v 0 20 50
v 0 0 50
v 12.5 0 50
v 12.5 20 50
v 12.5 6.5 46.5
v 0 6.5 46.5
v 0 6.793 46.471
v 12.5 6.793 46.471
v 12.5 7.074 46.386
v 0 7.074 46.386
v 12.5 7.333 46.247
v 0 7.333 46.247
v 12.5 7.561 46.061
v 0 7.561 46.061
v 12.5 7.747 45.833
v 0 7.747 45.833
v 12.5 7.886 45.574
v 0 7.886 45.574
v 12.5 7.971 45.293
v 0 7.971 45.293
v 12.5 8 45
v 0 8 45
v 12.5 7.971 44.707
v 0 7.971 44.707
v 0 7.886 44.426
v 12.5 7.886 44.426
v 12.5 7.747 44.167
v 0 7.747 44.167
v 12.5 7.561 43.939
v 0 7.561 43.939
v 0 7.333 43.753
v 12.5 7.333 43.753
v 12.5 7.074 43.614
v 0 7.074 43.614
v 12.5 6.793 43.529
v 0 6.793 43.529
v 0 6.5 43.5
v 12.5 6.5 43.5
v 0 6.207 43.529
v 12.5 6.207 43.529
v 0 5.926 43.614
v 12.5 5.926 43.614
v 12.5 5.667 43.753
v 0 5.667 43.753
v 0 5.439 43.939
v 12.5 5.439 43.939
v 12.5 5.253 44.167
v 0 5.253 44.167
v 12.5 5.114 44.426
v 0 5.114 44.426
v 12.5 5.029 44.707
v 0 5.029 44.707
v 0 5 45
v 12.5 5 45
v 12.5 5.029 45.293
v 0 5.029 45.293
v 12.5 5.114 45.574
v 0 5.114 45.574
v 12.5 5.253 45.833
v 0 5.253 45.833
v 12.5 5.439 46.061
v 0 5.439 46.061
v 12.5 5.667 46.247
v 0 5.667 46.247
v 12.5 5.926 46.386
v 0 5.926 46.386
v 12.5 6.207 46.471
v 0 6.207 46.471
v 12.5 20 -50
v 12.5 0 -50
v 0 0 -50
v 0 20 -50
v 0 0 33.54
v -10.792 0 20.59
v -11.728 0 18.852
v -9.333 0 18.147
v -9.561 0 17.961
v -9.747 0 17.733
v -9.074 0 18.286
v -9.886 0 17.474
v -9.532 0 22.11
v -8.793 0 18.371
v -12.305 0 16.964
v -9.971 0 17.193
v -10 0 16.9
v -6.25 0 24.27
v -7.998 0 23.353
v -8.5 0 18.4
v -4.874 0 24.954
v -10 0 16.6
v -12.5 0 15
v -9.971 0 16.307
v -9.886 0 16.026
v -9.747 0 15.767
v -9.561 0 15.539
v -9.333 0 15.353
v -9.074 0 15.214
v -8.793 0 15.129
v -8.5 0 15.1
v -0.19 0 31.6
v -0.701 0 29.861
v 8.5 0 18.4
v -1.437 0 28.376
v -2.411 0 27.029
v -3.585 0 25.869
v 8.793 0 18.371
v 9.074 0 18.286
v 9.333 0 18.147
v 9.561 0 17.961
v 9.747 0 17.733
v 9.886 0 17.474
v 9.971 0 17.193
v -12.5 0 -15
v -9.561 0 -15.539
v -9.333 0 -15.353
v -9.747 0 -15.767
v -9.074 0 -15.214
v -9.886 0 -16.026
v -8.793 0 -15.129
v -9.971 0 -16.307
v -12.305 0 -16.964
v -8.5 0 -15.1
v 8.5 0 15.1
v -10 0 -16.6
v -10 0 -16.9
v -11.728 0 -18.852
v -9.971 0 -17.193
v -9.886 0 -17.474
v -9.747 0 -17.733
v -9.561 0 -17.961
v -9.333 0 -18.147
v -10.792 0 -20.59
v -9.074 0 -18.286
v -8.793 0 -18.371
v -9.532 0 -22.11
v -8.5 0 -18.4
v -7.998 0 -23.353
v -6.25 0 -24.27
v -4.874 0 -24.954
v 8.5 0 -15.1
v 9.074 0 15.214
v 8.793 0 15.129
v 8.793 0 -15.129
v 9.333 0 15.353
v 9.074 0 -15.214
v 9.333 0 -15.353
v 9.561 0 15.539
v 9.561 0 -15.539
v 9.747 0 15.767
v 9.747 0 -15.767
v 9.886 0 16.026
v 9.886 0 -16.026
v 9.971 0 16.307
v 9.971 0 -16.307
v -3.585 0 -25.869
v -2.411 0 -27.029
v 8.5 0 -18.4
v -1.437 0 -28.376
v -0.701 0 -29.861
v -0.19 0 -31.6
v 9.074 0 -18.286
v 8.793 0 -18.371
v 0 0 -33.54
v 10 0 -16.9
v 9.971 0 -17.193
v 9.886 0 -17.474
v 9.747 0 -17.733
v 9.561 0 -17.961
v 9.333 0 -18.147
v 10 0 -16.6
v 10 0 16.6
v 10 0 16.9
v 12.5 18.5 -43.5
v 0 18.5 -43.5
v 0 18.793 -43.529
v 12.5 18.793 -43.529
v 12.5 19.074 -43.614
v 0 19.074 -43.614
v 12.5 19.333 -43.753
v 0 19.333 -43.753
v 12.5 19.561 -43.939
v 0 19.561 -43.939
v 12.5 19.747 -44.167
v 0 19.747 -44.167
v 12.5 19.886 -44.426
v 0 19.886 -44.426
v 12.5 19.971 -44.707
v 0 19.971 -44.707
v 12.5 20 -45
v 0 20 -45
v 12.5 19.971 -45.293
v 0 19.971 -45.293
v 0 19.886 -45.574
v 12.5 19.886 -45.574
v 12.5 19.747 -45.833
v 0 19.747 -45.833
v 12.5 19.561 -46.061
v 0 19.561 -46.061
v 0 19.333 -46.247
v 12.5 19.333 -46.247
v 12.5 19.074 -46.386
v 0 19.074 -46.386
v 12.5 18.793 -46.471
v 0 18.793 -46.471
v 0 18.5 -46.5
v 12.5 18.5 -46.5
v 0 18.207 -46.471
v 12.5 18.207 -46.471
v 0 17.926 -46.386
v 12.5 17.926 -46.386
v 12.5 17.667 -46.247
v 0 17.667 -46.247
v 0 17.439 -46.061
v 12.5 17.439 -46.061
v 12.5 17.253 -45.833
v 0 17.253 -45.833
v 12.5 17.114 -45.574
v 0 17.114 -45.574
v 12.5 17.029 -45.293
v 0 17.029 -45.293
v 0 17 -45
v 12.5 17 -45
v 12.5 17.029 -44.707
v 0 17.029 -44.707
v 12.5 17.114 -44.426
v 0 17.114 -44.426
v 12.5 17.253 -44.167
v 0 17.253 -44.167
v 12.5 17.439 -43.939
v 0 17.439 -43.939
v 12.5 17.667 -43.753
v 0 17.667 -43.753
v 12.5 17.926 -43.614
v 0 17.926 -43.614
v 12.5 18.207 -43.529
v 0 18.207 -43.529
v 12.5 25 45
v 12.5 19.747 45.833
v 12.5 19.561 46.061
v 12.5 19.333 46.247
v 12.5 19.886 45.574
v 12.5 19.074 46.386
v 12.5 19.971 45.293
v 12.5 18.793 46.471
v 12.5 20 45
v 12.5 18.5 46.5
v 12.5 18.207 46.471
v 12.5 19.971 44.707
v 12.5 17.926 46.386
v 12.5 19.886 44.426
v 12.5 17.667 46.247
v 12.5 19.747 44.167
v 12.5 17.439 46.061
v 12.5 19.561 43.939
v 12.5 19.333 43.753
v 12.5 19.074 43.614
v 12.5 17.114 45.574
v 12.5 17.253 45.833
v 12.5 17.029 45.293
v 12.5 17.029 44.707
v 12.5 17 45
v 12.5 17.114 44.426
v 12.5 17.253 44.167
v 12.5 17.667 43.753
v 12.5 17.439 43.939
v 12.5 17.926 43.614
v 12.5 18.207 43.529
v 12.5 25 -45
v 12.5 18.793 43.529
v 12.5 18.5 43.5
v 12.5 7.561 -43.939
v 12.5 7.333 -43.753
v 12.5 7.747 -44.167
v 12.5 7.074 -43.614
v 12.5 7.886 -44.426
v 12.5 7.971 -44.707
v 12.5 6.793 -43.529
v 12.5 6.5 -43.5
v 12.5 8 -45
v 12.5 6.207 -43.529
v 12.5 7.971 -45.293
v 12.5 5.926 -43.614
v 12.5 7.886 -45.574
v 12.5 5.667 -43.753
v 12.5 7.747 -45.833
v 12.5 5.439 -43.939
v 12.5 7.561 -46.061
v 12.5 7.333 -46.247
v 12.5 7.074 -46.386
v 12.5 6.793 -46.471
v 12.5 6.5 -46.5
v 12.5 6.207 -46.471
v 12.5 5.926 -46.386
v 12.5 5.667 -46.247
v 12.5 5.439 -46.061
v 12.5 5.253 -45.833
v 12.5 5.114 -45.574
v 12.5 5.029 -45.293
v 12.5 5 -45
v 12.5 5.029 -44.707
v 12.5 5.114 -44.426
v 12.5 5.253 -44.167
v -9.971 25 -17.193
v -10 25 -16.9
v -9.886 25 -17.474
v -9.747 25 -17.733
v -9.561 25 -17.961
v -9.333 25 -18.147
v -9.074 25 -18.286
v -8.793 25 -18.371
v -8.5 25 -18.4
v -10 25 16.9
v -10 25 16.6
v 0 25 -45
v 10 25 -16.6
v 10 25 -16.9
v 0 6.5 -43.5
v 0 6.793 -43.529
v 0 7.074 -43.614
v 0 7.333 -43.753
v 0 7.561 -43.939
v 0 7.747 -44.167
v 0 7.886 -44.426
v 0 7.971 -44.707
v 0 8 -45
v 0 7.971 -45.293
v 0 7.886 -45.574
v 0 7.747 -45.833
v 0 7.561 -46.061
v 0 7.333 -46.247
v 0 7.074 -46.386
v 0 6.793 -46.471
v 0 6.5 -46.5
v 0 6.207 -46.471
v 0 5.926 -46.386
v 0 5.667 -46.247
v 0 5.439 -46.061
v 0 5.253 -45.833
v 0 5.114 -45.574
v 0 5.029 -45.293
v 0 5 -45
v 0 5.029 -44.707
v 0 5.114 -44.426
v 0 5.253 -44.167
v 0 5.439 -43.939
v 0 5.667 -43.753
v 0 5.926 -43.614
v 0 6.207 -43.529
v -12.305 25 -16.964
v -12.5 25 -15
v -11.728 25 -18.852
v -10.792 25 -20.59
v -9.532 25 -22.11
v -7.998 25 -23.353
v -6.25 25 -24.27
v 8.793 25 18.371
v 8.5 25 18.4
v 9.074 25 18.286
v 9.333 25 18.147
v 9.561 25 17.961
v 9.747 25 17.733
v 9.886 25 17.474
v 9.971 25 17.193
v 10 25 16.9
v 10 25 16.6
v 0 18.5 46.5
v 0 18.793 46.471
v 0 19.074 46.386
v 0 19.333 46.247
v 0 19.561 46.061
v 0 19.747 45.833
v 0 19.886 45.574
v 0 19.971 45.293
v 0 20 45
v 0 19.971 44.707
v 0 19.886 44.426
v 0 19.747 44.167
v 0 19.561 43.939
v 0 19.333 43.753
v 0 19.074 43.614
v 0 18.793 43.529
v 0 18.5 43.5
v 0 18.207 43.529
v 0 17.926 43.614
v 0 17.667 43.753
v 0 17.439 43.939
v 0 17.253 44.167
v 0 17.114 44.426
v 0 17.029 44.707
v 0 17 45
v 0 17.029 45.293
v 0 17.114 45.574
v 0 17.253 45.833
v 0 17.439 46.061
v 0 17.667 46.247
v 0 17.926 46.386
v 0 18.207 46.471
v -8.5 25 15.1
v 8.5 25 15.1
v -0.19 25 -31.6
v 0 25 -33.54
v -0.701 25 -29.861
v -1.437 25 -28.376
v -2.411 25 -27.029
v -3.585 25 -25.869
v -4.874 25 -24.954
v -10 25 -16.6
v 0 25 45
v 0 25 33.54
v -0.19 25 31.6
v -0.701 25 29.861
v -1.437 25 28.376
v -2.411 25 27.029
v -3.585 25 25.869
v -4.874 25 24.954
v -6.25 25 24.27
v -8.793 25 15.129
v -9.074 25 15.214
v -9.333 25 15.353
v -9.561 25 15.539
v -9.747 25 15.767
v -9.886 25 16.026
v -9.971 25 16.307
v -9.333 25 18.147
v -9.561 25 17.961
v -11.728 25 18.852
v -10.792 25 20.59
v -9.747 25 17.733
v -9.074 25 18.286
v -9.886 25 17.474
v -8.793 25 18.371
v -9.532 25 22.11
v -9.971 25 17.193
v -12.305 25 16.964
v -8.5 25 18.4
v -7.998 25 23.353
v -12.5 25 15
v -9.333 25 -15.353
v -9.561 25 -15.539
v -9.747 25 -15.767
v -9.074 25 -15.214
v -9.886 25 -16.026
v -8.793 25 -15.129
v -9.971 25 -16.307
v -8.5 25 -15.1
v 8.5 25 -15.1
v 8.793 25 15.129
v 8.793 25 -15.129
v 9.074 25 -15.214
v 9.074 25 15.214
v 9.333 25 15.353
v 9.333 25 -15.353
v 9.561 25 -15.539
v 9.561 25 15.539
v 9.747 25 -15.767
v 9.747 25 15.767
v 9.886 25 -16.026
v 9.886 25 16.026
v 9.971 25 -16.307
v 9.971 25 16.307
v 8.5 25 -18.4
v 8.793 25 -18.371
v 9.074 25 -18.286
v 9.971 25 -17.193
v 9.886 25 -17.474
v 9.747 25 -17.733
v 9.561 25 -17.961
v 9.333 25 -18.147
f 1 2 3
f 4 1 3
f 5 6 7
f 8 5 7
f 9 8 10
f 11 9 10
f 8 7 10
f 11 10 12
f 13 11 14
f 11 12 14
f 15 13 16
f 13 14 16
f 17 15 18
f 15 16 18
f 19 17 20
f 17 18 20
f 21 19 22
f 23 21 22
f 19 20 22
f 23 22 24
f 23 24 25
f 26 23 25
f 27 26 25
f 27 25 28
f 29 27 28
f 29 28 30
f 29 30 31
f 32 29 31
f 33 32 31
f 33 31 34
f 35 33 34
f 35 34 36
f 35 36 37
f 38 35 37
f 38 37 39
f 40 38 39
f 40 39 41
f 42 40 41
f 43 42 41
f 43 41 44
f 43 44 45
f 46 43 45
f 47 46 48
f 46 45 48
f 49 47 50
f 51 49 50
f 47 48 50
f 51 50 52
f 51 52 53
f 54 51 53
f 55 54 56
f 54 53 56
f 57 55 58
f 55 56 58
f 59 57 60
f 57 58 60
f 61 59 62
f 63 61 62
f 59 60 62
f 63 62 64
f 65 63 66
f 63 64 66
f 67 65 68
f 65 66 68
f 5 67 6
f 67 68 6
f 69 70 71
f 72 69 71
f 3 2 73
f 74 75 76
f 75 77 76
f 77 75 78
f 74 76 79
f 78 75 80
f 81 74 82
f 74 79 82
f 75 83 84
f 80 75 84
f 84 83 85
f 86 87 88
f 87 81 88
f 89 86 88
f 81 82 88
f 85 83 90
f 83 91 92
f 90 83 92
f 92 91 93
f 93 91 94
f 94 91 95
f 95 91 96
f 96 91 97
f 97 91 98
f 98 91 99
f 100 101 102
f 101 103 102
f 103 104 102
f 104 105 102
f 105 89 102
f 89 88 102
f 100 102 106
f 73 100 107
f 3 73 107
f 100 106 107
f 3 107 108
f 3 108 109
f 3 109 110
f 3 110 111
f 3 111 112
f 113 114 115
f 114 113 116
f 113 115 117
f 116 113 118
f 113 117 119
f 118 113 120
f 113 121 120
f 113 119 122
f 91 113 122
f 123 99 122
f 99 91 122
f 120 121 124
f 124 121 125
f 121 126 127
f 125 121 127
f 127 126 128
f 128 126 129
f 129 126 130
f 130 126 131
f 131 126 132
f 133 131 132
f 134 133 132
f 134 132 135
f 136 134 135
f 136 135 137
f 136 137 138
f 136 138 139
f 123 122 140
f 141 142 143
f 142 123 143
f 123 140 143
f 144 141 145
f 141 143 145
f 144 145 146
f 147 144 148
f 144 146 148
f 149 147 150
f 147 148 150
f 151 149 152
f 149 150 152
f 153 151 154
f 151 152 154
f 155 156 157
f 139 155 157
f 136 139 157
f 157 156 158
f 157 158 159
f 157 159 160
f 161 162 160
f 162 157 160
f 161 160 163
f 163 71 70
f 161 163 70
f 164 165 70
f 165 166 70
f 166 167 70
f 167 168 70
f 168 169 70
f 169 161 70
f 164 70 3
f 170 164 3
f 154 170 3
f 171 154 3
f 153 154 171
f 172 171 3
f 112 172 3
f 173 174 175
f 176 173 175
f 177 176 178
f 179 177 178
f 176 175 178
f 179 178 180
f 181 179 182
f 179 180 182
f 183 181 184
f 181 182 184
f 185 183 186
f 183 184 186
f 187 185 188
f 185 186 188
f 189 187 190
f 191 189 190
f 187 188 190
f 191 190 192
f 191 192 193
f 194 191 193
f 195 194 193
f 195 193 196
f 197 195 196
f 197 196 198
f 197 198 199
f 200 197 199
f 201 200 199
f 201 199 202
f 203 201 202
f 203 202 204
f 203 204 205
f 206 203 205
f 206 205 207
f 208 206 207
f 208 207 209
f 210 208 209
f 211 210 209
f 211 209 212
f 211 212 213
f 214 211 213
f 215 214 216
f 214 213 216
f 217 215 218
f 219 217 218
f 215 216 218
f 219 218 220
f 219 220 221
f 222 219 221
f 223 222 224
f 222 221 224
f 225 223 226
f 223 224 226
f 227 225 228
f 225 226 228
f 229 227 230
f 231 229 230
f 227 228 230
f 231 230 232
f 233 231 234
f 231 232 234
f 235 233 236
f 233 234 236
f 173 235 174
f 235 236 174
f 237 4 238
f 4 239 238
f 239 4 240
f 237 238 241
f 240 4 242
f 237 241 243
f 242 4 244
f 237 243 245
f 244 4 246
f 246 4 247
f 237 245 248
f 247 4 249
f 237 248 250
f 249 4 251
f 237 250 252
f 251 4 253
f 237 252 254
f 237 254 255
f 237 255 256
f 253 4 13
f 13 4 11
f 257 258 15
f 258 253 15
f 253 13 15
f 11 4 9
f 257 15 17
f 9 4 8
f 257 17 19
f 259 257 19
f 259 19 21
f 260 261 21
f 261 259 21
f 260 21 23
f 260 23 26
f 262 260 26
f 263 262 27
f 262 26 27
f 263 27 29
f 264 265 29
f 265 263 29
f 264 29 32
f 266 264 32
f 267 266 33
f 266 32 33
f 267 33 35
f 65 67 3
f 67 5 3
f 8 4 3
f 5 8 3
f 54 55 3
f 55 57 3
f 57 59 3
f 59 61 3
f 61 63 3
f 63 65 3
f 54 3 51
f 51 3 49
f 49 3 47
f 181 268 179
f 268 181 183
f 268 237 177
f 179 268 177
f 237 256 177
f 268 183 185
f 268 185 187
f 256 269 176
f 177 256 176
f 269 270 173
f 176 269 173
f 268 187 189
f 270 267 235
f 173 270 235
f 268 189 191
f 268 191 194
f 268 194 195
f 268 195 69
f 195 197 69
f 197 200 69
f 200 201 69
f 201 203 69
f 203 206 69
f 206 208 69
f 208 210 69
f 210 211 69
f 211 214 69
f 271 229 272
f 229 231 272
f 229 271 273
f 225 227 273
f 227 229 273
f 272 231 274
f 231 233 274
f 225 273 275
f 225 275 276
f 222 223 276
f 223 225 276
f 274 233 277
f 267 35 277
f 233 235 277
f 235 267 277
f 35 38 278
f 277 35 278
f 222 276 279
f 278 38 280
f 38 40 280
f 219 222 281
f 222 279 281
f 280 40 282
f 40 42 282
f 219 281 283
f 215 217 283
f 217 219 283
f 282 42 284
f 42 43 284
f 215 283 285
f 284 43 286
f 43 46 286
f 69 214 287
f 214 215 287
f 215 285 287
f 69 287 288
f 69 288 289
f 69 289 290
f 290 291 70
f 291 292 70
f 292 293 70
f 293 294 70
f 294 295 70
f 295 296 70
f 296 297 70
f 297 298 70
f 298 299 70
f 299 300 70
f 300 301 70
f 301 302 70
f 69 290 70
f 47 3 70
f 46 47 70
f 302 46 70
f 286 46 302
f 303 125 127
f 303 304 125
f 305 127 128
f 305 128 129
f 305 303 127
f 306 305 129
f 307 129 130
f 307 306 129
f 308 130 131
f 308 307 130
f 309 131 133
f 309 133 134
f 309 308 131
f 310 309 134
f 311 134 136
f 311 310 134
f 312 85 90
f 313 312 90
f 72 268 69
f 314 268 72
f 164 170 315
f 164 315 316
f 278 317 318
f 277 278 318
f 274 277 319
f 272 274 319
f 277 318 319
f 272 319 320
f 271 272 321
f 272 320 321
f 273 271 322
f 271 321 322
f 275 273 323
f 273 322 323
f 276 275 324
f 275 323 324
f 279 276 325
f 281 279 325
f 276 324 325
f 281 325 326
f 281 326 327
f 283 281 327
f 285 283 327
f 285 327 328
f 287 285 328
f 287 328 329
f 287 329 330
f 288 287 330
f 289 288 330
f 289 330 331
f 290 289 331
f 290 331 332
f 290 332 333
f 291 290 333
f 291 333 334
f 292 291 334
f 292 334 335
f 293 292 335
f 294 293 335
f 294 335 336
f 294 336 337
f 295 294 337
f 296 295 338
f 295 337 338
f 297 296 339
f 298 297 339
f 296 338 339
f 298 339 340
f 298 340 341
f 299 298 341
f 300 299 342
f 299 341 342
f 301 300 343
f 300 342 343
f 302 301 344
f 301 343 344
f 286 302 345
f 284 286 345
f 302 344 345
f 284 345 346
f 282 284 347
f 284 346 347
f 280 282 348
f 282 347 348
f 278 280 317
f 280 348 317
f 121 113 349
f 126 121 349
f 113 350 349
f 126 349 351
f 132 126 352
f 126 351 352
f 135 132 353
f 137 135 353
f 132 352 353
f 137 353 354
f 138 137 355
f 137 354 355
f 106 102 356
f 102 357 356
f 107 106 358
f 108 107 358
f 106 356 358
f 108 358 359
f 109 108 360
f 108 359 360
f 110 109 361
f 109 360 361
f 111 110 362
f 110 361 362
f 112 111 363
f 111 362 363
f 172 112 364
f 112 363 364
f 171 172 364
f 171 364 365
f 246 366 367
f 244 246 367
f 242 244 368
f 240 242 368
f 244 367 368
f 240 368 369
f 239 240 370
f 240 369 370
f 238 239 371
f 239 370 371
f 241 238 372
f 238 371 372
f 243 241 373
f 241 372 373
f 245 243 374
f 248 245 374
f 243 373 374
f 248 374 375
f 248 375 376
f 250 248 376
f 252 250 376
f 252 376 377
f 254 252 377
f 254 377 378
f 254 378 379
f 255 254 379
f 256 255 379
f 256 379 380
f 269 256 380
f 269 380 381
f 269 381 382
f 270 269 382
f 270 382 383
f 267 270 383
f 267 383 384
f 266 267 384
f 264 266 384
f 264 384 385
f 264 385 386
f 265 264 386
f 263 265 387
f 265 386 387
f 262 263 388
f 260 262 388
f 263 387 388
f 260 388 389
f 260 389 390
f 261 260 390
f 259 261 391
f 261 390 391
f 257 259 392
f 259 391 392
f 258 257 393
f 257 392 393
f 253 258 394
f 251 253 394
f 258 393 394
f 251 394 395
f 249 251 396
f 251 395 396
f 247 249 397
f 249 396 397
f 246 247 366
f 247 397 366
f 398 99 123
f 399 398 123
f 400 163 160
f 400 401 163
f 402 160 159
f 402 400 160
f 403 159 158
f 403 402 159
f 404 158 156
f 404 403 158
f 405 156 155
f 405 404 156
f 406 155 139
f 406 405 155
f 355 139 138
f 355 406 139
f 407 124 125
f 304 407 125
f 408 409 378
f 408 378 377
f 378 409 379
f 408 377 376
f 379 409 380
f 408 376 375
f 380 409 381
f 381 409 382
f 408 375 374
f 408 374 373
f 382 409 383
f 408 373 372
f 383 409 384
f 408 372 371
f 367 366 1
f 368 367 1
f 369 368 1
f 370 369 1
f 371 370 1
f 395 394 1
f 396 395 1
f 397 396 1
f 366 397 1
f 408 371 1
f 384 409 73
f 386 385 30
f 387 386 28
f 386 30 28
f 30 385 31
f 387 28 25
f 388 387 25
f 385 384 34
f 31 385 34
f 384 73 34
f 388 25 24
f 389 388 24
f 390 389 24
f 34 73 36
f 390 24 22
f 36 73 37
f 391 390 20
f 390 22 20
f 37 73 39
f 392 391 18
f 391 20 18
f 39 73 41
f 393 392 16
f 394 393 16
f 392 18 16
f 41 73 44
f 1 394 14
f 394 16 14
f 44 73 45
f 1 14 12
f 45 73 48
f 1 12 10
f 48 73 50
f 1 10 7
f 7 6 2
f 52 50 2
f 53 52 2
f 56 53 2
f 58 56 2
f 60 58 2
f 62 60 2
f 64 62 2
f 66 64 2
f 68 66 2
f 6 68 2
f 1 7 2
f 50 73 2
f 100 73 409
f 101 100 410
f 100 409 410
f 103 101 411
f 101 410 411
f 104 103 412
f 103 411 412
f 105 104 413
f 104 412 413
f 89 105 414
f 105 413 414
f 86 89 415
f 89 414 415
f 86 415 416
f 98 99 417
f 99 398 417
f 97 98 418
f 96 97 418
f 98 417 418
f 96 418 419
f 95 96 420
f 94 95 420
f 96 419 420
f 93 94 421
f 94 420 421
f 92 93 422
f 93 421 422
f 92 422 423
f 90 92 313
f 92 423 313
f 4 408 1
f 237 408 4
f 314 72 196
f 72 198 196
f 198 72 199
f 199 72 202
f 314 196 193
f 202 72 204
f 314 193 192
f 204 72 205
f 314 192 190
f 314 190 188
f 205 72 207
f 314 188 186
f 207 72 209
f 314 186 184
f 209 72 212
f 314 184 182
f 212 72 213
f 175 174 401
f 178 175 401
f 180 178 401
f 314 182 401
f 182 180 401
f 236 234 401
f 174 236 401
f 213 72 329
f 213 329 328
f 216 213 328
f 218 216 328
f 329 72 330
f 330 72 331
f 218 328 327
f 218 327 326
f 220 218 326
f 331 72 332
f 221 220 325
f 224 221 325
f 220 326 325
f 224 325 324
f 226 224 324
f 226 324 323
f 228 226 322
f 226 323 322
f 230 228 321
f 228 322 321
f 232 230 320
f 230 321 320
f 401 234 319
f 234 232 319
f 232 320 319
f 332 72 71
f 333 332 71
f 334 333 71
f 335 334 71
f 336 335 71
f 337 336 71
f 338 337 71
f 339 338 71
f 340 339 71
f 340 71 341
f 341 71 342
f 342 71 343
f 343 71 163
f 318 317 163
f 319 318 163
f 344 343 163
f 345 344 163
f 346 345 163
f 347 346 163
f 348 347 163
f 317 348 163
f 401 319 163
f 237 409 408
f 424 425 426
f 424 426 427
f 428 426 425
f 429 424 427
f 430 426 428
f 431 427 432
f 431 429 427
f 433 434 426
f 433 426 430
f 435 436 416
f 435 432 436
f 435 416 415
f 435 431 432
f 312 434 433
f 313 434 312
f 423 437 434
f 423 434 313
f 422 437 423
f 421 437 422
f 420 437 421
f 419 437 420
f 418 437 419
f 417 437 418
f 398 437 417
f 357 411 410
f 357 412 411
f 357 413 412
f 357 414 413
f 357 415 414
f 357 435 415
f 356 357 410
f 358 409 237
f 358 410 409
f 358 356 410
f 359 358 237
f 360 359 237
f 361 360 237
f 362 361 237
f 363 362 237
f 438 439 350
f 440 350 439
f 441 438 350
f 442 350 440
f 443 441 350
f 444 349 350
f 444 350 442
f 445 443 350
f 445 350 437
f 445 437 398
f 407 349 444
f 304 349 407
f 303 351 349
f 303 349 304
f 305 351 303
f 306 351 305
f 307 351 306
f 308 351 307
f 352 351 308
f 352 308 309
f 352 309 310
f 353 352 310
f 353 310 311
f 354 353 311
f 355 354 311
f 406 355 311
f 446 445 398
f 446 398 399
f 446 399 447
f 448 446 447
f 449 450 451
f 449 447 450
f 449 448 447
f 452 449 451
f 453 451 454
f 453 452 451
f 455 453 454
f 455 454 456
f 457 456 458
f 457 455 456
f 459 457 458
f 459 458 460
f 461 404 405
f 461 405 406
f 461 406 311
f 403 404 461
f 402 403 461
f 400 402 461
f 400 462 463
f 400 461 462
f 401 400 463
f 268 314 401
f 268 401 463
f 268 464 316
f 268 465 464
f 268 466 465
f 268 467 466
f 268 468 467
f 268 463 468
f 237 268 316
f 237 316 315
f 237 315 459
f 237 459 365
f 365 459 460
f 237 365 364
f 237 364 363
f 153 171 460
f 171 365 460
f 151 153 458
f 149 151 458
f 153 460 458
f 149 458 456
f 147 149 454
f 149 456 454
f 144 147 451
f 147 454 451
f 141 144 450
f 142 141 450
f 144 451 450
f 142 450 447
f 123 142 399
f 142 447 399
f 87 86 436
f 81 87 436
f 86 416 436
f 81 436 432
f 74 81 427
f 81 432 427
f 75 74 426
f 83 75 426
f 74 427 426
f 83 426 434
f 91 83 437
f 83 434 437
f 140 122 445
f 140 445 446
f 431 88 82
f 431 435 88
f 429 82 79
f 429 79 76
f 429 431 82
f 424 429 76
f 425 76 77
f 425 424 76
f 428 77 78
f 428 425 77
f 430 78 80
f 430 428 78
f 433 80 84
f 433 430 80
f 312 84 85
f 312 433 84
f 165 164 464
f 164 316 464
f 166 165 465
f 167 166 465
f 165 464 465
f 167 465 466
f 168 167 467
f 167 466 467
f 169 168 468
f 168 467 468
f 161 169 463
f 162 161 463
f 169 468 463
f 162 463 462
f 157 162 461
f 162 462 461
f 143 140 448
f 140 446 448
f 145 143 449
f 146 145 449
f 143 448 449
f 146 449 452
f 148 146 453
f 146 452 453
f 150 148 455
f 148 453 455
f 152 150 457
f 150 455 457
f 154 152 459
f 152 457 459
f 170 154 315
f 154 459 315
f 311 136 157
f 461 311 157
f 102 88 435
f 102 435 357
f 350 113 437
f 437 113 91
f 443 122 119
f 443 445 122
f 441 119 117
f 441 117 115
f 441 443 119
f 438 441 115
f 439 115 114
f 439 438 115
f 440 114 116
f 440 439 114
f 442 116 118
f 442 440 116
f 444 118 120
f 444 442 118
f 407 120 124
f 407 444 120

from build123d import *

# Parameters (mm, degrees)
SKETCH_1_W          = 20
SKETCH_1_H          = 3.3
EXTRUDE_1_DEPTH     = 25
SKETCH_2_R          = 1.5
CUT_EXTRUDE_1_DEPTH = 13.5
SKETCH_3_R          = 1.5
CUT_EXTRUDE_2_DEPTH = 13.5
FILLET_6_R          = 10
FILLET_7_R          = 1.5
CHAMFER_1_SIZE      = 5
FILLET_8_R          = 10


with BuildPart() as part:
    # Эскиз1 → Бобышка-Вытянуть1 (new body)
    with BuildSketch(Plane(origin=(0, 0, 0), x_dir=(1, 0, 0), z_dir=(0, 1, 0))):
        Polygon((-12.5, -25), (0, -25), (0, -50), (12.5, -50), (12.5, 50), (0, 50), (0, 25), (-12.5, 25), align=None)
        with Locations((0, 16.75)):
            Rectangle(SKETCH_1_W, SKETCH_1_H, mode=Mode.SUBTRACT)
        with Locations((0, -16.75)):
            Rectangle(SKETCH_1_W, SKETCH_1_H, mode=Mode.SUBTRACT)
    extrude(amount=EXTRUDE_1_DEPTH)

    # Эскиз2 → Вырез-Вытянуть1 (cut, through all)
    with BuildSketch(Plane.ZY):
        with Locations((-45, 6.5)):
            Circle(SKETCH_2_R)
        with Locations((-45, 18.5)):
            Circle(SKETCH_2_R)
    extrude(amount=-CUT_EXTRUDE_1_DEPTH, mode=Mode.SUBTRACT)

    # Эскиз3 → Вырез-Вытянуть2 (cut, through all)
    with BuildSketch(Plane.ZY):
        with Locations((45, 6.5)):
            Circle(SKETCH_3_R)
        with Locations((45, 18.5)):
            Circle(SKETCH_3_R)
    extrude(amount=-CUT_EXTRUDE_2_DEPTH, mode=Mode.SUBTRACT)

    # Скругление6
    fillet_6_edges = [part.edges().sort_by_distance(p)[0] for p in [
        (-12.5, 12.5, 25),
        (-12.5, 12.5, -25),
    ]]
    fillet(fillet_6_edges, radius=FILLET_6_R)

    # Скругление7
    fillet_7_edges = [part.edges().sort_by_distance(p)[0] for p in [
        (-10, 12.5, -18.4),
        (-10, 12.5, -15.1),
        (10, 12.5, -15.1),
        (10, 12.5, -18.4),
        (-10, 12.5, 15.1),
        (-10, 12.5, 18.4),
        (10, 12.5, 18.4),
        (10, 12.5, 15.1),
    ]]
    fillet(fillet_7_edges, radius=FILLET_7_R)

    # Фаска1
    chamfer_1_edges = [part.edges().sort_by_distance(p)[0] for p in [
        (6.25, 25, 50),
        (6.25, 25, -50),
    ]]
    chamfer(chamfer_1_edges, length=CHAMFER_1_SIZE)

    # Скругление8
    fillet_8_edges = [part.edges().sort_by_distance(p)[0] for p in [
        (0, 12.5, 25),
        (0, 12.5, -25),
    ]]
    fillet(fillet_8_edges, radius=FILLET_8_R)


solid = part.part
